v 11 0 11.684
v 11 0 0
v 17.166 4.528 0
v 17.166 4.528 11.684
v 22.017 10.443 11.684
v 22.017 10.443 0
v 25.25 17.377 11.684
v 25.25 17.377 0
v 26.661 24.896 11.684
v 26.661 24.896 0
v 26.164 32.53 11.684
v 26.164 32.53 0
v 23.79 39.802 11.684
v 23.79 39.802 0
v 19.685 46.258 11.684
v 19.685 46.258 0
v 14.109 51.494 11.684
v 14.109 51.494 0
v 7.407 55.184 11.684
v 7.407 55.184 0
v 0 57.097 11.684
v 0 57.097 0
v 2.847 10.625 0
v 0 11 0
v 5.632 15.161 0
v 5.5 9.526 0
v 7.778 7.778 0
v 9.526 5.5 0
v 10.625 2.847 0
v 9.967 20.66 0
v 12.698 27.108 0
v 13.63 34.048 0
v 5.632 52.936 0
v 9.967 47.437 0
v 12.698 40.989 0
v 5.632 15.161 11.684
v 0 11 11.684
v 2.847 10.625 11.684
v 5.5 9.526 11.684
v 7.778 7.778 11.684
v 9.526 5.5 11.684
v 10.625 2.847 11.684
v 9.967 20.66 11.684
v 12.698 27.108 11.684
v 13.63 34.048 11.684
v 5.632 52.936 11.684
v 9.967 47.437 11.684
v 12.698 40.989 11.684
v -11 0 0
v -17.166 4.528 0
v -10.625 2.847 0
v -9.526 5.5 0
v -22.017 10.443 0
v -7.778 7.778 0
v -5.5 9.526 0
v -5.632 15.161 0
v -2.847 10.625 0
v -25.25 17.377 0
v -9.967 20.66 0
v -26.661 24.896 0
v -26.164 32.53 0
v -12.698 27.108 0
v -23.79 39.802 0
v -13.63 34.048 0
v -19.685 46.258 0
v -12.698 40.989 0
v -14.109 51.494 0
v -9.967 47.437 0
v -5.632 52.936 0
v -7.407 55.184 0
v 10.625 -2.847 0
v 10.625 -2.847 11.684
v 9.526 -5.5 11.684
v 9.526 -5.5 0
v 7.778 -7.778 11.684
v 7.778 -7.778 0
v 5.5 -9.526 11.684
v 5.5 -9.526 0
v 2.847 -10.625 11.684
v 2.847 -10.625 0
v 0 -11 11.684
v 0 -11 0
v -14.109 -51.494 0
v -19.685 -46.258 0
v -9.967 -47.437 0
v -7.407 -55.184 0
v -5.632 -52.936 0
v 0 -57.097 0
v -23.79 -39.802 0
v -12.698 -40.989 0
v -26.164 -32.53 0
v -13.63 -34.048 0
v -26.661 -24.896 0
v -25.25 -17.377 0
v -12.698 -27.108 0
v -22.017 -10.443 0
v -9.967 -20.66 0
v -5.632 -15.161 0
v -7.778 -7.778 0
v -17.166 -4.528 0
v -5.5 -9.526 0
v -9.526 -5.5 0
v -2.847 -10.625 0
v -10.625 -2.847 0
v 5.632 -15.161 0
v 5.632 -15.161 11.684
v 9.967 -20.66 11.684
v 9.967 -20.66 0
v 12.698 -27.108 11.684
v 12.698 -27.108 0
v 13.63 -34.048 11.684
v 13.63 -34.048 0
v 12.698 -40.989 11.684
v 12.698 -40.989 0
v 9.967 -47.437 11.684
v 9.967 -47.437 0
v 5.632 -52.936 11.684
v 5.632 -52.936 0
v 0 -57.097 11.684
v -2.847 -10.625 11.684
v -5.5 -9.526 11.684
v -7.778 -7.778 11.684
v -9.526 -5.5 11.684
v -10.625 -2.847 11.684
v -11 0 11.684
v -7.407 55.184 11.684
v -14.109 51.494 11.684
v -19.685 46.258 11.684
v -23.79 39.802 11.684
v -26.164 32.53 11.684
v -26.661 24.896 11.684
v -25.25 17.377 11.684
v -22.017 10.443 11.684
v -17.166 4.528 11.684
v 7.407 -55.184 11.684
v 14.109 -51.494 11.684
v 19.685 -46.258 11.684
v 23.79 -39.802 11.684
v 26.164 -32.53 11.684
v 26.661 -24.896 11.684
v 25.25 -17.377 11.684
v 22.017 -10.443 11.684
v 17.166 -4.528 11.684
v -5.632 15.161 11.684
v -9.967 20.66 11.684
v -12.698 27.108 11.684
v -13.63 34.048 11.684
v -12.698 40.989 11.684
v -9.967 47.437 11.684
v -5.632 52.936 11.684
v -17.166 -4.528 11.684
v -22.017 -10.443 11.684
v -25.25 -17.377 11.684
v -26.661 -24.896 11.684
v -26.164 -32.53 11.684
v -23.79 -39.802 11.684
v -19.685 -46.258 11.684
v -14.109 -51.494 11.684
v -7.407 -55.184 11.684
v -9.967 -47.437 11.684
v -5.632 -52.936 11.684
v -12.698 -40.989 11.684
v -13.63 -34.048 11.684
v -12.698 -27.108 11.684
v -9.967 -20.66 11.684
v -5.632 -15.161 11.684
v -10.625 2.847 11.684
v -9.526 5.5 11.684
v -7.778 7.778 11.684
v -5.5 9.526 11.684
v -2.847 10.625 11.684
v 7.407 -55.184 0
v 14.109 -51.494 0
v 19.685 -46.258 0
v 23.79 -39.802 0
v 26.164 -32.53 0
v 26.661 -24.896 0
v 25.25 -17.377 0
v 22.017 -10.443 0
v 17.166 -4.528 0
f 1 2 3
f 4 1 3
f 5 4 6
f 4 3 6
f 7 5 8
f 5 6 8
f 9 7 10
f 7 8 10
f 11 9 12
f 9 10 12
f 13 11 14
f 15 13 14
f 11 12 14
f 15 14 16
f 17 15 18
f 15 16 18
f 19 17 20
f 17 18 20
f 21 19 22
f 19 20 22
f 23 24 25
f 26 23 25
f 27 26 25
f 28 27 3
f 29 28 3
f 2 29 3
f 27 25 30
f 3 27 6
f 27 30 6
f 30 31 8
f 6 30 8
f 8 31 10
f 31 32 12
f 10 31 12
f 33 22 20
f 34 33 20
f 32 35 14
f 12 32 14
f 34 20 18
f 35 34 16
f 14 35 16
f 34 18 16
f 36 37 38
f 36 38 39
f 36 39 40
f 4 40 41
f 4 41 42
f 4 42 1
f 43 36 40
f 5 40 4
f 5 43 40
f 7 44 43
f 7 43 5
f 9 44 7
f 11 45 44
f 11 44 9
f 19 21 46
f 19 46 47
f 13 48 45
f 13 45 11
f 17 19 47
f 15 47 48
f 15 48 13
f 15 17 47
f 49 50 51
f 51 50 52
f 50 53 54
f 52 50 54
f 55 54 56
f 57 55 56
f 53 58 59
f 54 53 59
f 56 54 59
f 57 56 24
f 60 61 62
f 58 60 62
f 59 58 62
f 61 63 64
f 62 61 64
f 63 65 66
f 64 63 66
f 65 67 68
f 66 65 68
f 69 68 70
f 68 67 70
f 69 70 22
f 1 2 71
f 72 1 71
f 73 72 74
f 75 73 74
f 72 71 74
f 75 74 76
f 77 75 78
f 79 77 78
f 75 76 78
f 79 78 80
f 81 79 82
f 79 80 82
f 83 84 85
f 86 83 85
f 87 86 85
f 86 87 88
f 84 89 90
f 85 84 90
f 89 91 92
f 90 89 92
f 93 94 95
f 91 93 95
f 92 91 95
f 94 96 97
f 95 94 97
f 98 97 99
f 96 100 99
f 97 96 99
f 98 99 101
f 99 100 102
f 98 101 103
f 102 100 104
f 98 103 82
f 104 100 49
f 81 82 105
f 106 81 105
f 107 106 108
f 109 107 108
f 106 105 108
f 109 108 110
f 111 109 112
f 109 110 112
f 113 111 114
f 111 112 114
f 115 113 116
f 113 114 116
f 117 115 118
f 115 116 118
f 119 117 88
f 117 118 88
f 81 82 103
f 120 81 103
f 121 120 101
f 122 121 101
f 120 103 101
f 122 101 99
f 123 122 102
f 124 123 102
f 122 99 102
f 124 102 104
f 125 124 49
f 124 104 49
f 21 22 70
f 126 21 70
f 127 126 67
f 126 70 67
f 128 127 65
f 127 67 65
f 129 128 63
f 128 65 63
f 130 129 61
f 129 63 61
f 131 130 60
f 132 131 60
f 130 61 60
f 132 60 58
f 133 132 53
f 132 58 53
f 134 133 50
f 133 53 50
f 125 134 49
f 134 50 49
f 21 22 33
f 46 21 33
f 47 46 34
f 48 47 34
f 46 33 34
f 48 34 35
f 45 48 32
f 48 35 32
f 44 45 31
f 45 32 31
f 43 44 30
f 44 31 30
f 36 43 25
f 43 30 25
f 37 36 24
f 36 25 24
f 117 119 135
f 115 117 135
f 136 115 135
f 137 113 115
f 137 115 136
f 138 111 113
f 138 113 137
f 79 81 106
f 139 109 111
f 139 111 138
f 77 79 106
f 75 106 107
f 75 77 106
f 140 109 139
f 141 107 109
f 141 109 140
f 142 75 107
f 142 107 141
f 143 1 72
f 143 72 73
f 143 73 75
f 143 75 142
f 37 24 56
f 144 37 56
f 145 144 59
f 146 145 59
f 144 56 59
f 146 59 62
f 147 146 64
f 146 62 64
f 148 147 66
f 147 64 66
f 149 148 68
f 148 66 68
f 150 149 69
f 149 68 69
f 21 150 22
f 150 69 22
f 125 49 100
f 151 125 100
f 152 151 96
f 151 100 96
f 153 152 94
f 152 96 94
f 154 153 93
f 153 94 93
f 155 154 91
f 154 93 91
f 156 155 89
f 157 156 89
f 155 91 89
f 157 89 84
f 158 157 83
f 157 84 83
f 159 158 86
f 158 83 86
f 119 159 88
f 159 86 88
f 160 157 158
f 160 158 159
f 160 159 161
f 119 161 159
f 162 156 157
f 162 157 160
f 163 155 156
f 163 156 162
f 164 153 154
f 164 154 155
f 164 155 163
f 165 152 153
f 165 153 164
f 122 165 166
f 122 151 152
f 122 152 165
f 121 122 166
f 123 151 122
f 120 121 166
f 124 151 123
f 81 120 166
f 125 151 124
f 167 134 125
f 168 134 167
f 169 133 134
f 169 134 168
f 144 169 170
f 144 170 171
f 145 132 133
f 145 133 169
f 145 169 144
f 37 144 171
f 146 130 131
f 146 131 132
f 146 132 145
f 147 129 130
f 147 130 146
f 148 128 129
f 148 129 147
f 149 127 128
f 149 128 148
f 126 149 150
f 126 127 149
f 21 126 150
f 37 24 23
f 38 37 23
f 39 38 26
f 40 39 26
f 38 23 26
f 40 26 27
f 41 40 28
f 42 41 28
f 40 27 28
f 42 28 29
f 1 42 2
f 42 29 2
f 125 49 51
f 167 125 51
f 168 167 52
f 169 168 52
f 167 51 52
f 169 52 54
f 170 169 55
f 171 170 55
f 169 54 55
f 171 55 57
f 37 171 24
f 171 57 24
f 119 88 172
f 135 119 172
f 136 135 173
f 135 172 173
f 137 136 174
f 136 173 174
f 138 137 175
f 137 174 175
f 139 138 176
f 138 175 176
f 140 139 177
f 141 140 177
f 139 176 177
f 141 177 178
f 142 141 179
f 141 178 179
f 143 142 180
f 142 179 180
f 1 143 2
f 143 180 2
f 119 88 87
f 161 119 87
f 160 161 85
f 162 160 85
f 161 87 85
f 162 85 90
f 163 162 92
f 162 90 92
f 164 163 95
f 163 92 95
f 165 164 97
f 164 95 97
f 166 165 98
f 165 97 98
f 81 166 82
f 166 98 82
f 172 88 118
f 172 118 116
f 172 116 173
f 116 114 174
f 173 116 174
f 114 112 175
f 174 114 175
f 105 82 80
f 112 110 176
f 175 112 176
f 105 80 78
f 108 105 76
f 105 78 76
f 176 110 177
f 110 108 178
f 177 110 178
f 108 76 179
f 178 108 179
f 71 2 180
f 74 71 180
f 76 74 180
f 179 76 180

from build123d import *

# Parameters (mm, degrees)
F1_DEPTH = 11.684


with BuildPart() as f1:
    # F0 (on Top) → F1 (new body)
    with BuildSketch(Plane.XY):
        with BuildLine():
            ThreePointArc((-11.000003, 0), (-7.778177, 7.778177), (0, 11.000003))
            ThreePointArc((0, 11.000003), (-13.629779, 34.048445), (0, 57.096887))
            ThreePointArc((0, 57.096887), (-26.164245, 32.529514), (-11.000003, 0))
        make_face()
        with BuildLine():
            ThreePointArc((0, 11.000003), (7.778177, 7.778177), (11.000003, 0))
            ThreePointArc((11.000003, 0), (26.164245, 32.529514), (0, 57.096887))
            ThreePointArc((0, 57.096887), (13.629779, 34.048445), (0, 11.000003))
        make_face()
        with BuildLine():
            ThreePointArc((0, -57.096887), (-13.629779, -34.048445), (0, -11.000003))
            ThreePointArc((0, -11.000003), (-7.778177, -7.778177), (-11.000003, 0))
            ThreePointArc((-11.000003, 0), (-26.164245, -32.529514), (0, -57.096887))
        make_face()
        with BuildLine():
            ThreePointArc((0, -57.096887), (26.164245, -32.529514), (11.000003, 0))
            ThreePointArc((11.000003, 0), (7.778177, -7.778177), (0, -11.000003))
            ThreePointArc((0, -11.000003), (13.629779, -34.048445), (0, -57.096887))
        make_face()
    extrude(amount=F1_DEPTH)


solid = f1.part
